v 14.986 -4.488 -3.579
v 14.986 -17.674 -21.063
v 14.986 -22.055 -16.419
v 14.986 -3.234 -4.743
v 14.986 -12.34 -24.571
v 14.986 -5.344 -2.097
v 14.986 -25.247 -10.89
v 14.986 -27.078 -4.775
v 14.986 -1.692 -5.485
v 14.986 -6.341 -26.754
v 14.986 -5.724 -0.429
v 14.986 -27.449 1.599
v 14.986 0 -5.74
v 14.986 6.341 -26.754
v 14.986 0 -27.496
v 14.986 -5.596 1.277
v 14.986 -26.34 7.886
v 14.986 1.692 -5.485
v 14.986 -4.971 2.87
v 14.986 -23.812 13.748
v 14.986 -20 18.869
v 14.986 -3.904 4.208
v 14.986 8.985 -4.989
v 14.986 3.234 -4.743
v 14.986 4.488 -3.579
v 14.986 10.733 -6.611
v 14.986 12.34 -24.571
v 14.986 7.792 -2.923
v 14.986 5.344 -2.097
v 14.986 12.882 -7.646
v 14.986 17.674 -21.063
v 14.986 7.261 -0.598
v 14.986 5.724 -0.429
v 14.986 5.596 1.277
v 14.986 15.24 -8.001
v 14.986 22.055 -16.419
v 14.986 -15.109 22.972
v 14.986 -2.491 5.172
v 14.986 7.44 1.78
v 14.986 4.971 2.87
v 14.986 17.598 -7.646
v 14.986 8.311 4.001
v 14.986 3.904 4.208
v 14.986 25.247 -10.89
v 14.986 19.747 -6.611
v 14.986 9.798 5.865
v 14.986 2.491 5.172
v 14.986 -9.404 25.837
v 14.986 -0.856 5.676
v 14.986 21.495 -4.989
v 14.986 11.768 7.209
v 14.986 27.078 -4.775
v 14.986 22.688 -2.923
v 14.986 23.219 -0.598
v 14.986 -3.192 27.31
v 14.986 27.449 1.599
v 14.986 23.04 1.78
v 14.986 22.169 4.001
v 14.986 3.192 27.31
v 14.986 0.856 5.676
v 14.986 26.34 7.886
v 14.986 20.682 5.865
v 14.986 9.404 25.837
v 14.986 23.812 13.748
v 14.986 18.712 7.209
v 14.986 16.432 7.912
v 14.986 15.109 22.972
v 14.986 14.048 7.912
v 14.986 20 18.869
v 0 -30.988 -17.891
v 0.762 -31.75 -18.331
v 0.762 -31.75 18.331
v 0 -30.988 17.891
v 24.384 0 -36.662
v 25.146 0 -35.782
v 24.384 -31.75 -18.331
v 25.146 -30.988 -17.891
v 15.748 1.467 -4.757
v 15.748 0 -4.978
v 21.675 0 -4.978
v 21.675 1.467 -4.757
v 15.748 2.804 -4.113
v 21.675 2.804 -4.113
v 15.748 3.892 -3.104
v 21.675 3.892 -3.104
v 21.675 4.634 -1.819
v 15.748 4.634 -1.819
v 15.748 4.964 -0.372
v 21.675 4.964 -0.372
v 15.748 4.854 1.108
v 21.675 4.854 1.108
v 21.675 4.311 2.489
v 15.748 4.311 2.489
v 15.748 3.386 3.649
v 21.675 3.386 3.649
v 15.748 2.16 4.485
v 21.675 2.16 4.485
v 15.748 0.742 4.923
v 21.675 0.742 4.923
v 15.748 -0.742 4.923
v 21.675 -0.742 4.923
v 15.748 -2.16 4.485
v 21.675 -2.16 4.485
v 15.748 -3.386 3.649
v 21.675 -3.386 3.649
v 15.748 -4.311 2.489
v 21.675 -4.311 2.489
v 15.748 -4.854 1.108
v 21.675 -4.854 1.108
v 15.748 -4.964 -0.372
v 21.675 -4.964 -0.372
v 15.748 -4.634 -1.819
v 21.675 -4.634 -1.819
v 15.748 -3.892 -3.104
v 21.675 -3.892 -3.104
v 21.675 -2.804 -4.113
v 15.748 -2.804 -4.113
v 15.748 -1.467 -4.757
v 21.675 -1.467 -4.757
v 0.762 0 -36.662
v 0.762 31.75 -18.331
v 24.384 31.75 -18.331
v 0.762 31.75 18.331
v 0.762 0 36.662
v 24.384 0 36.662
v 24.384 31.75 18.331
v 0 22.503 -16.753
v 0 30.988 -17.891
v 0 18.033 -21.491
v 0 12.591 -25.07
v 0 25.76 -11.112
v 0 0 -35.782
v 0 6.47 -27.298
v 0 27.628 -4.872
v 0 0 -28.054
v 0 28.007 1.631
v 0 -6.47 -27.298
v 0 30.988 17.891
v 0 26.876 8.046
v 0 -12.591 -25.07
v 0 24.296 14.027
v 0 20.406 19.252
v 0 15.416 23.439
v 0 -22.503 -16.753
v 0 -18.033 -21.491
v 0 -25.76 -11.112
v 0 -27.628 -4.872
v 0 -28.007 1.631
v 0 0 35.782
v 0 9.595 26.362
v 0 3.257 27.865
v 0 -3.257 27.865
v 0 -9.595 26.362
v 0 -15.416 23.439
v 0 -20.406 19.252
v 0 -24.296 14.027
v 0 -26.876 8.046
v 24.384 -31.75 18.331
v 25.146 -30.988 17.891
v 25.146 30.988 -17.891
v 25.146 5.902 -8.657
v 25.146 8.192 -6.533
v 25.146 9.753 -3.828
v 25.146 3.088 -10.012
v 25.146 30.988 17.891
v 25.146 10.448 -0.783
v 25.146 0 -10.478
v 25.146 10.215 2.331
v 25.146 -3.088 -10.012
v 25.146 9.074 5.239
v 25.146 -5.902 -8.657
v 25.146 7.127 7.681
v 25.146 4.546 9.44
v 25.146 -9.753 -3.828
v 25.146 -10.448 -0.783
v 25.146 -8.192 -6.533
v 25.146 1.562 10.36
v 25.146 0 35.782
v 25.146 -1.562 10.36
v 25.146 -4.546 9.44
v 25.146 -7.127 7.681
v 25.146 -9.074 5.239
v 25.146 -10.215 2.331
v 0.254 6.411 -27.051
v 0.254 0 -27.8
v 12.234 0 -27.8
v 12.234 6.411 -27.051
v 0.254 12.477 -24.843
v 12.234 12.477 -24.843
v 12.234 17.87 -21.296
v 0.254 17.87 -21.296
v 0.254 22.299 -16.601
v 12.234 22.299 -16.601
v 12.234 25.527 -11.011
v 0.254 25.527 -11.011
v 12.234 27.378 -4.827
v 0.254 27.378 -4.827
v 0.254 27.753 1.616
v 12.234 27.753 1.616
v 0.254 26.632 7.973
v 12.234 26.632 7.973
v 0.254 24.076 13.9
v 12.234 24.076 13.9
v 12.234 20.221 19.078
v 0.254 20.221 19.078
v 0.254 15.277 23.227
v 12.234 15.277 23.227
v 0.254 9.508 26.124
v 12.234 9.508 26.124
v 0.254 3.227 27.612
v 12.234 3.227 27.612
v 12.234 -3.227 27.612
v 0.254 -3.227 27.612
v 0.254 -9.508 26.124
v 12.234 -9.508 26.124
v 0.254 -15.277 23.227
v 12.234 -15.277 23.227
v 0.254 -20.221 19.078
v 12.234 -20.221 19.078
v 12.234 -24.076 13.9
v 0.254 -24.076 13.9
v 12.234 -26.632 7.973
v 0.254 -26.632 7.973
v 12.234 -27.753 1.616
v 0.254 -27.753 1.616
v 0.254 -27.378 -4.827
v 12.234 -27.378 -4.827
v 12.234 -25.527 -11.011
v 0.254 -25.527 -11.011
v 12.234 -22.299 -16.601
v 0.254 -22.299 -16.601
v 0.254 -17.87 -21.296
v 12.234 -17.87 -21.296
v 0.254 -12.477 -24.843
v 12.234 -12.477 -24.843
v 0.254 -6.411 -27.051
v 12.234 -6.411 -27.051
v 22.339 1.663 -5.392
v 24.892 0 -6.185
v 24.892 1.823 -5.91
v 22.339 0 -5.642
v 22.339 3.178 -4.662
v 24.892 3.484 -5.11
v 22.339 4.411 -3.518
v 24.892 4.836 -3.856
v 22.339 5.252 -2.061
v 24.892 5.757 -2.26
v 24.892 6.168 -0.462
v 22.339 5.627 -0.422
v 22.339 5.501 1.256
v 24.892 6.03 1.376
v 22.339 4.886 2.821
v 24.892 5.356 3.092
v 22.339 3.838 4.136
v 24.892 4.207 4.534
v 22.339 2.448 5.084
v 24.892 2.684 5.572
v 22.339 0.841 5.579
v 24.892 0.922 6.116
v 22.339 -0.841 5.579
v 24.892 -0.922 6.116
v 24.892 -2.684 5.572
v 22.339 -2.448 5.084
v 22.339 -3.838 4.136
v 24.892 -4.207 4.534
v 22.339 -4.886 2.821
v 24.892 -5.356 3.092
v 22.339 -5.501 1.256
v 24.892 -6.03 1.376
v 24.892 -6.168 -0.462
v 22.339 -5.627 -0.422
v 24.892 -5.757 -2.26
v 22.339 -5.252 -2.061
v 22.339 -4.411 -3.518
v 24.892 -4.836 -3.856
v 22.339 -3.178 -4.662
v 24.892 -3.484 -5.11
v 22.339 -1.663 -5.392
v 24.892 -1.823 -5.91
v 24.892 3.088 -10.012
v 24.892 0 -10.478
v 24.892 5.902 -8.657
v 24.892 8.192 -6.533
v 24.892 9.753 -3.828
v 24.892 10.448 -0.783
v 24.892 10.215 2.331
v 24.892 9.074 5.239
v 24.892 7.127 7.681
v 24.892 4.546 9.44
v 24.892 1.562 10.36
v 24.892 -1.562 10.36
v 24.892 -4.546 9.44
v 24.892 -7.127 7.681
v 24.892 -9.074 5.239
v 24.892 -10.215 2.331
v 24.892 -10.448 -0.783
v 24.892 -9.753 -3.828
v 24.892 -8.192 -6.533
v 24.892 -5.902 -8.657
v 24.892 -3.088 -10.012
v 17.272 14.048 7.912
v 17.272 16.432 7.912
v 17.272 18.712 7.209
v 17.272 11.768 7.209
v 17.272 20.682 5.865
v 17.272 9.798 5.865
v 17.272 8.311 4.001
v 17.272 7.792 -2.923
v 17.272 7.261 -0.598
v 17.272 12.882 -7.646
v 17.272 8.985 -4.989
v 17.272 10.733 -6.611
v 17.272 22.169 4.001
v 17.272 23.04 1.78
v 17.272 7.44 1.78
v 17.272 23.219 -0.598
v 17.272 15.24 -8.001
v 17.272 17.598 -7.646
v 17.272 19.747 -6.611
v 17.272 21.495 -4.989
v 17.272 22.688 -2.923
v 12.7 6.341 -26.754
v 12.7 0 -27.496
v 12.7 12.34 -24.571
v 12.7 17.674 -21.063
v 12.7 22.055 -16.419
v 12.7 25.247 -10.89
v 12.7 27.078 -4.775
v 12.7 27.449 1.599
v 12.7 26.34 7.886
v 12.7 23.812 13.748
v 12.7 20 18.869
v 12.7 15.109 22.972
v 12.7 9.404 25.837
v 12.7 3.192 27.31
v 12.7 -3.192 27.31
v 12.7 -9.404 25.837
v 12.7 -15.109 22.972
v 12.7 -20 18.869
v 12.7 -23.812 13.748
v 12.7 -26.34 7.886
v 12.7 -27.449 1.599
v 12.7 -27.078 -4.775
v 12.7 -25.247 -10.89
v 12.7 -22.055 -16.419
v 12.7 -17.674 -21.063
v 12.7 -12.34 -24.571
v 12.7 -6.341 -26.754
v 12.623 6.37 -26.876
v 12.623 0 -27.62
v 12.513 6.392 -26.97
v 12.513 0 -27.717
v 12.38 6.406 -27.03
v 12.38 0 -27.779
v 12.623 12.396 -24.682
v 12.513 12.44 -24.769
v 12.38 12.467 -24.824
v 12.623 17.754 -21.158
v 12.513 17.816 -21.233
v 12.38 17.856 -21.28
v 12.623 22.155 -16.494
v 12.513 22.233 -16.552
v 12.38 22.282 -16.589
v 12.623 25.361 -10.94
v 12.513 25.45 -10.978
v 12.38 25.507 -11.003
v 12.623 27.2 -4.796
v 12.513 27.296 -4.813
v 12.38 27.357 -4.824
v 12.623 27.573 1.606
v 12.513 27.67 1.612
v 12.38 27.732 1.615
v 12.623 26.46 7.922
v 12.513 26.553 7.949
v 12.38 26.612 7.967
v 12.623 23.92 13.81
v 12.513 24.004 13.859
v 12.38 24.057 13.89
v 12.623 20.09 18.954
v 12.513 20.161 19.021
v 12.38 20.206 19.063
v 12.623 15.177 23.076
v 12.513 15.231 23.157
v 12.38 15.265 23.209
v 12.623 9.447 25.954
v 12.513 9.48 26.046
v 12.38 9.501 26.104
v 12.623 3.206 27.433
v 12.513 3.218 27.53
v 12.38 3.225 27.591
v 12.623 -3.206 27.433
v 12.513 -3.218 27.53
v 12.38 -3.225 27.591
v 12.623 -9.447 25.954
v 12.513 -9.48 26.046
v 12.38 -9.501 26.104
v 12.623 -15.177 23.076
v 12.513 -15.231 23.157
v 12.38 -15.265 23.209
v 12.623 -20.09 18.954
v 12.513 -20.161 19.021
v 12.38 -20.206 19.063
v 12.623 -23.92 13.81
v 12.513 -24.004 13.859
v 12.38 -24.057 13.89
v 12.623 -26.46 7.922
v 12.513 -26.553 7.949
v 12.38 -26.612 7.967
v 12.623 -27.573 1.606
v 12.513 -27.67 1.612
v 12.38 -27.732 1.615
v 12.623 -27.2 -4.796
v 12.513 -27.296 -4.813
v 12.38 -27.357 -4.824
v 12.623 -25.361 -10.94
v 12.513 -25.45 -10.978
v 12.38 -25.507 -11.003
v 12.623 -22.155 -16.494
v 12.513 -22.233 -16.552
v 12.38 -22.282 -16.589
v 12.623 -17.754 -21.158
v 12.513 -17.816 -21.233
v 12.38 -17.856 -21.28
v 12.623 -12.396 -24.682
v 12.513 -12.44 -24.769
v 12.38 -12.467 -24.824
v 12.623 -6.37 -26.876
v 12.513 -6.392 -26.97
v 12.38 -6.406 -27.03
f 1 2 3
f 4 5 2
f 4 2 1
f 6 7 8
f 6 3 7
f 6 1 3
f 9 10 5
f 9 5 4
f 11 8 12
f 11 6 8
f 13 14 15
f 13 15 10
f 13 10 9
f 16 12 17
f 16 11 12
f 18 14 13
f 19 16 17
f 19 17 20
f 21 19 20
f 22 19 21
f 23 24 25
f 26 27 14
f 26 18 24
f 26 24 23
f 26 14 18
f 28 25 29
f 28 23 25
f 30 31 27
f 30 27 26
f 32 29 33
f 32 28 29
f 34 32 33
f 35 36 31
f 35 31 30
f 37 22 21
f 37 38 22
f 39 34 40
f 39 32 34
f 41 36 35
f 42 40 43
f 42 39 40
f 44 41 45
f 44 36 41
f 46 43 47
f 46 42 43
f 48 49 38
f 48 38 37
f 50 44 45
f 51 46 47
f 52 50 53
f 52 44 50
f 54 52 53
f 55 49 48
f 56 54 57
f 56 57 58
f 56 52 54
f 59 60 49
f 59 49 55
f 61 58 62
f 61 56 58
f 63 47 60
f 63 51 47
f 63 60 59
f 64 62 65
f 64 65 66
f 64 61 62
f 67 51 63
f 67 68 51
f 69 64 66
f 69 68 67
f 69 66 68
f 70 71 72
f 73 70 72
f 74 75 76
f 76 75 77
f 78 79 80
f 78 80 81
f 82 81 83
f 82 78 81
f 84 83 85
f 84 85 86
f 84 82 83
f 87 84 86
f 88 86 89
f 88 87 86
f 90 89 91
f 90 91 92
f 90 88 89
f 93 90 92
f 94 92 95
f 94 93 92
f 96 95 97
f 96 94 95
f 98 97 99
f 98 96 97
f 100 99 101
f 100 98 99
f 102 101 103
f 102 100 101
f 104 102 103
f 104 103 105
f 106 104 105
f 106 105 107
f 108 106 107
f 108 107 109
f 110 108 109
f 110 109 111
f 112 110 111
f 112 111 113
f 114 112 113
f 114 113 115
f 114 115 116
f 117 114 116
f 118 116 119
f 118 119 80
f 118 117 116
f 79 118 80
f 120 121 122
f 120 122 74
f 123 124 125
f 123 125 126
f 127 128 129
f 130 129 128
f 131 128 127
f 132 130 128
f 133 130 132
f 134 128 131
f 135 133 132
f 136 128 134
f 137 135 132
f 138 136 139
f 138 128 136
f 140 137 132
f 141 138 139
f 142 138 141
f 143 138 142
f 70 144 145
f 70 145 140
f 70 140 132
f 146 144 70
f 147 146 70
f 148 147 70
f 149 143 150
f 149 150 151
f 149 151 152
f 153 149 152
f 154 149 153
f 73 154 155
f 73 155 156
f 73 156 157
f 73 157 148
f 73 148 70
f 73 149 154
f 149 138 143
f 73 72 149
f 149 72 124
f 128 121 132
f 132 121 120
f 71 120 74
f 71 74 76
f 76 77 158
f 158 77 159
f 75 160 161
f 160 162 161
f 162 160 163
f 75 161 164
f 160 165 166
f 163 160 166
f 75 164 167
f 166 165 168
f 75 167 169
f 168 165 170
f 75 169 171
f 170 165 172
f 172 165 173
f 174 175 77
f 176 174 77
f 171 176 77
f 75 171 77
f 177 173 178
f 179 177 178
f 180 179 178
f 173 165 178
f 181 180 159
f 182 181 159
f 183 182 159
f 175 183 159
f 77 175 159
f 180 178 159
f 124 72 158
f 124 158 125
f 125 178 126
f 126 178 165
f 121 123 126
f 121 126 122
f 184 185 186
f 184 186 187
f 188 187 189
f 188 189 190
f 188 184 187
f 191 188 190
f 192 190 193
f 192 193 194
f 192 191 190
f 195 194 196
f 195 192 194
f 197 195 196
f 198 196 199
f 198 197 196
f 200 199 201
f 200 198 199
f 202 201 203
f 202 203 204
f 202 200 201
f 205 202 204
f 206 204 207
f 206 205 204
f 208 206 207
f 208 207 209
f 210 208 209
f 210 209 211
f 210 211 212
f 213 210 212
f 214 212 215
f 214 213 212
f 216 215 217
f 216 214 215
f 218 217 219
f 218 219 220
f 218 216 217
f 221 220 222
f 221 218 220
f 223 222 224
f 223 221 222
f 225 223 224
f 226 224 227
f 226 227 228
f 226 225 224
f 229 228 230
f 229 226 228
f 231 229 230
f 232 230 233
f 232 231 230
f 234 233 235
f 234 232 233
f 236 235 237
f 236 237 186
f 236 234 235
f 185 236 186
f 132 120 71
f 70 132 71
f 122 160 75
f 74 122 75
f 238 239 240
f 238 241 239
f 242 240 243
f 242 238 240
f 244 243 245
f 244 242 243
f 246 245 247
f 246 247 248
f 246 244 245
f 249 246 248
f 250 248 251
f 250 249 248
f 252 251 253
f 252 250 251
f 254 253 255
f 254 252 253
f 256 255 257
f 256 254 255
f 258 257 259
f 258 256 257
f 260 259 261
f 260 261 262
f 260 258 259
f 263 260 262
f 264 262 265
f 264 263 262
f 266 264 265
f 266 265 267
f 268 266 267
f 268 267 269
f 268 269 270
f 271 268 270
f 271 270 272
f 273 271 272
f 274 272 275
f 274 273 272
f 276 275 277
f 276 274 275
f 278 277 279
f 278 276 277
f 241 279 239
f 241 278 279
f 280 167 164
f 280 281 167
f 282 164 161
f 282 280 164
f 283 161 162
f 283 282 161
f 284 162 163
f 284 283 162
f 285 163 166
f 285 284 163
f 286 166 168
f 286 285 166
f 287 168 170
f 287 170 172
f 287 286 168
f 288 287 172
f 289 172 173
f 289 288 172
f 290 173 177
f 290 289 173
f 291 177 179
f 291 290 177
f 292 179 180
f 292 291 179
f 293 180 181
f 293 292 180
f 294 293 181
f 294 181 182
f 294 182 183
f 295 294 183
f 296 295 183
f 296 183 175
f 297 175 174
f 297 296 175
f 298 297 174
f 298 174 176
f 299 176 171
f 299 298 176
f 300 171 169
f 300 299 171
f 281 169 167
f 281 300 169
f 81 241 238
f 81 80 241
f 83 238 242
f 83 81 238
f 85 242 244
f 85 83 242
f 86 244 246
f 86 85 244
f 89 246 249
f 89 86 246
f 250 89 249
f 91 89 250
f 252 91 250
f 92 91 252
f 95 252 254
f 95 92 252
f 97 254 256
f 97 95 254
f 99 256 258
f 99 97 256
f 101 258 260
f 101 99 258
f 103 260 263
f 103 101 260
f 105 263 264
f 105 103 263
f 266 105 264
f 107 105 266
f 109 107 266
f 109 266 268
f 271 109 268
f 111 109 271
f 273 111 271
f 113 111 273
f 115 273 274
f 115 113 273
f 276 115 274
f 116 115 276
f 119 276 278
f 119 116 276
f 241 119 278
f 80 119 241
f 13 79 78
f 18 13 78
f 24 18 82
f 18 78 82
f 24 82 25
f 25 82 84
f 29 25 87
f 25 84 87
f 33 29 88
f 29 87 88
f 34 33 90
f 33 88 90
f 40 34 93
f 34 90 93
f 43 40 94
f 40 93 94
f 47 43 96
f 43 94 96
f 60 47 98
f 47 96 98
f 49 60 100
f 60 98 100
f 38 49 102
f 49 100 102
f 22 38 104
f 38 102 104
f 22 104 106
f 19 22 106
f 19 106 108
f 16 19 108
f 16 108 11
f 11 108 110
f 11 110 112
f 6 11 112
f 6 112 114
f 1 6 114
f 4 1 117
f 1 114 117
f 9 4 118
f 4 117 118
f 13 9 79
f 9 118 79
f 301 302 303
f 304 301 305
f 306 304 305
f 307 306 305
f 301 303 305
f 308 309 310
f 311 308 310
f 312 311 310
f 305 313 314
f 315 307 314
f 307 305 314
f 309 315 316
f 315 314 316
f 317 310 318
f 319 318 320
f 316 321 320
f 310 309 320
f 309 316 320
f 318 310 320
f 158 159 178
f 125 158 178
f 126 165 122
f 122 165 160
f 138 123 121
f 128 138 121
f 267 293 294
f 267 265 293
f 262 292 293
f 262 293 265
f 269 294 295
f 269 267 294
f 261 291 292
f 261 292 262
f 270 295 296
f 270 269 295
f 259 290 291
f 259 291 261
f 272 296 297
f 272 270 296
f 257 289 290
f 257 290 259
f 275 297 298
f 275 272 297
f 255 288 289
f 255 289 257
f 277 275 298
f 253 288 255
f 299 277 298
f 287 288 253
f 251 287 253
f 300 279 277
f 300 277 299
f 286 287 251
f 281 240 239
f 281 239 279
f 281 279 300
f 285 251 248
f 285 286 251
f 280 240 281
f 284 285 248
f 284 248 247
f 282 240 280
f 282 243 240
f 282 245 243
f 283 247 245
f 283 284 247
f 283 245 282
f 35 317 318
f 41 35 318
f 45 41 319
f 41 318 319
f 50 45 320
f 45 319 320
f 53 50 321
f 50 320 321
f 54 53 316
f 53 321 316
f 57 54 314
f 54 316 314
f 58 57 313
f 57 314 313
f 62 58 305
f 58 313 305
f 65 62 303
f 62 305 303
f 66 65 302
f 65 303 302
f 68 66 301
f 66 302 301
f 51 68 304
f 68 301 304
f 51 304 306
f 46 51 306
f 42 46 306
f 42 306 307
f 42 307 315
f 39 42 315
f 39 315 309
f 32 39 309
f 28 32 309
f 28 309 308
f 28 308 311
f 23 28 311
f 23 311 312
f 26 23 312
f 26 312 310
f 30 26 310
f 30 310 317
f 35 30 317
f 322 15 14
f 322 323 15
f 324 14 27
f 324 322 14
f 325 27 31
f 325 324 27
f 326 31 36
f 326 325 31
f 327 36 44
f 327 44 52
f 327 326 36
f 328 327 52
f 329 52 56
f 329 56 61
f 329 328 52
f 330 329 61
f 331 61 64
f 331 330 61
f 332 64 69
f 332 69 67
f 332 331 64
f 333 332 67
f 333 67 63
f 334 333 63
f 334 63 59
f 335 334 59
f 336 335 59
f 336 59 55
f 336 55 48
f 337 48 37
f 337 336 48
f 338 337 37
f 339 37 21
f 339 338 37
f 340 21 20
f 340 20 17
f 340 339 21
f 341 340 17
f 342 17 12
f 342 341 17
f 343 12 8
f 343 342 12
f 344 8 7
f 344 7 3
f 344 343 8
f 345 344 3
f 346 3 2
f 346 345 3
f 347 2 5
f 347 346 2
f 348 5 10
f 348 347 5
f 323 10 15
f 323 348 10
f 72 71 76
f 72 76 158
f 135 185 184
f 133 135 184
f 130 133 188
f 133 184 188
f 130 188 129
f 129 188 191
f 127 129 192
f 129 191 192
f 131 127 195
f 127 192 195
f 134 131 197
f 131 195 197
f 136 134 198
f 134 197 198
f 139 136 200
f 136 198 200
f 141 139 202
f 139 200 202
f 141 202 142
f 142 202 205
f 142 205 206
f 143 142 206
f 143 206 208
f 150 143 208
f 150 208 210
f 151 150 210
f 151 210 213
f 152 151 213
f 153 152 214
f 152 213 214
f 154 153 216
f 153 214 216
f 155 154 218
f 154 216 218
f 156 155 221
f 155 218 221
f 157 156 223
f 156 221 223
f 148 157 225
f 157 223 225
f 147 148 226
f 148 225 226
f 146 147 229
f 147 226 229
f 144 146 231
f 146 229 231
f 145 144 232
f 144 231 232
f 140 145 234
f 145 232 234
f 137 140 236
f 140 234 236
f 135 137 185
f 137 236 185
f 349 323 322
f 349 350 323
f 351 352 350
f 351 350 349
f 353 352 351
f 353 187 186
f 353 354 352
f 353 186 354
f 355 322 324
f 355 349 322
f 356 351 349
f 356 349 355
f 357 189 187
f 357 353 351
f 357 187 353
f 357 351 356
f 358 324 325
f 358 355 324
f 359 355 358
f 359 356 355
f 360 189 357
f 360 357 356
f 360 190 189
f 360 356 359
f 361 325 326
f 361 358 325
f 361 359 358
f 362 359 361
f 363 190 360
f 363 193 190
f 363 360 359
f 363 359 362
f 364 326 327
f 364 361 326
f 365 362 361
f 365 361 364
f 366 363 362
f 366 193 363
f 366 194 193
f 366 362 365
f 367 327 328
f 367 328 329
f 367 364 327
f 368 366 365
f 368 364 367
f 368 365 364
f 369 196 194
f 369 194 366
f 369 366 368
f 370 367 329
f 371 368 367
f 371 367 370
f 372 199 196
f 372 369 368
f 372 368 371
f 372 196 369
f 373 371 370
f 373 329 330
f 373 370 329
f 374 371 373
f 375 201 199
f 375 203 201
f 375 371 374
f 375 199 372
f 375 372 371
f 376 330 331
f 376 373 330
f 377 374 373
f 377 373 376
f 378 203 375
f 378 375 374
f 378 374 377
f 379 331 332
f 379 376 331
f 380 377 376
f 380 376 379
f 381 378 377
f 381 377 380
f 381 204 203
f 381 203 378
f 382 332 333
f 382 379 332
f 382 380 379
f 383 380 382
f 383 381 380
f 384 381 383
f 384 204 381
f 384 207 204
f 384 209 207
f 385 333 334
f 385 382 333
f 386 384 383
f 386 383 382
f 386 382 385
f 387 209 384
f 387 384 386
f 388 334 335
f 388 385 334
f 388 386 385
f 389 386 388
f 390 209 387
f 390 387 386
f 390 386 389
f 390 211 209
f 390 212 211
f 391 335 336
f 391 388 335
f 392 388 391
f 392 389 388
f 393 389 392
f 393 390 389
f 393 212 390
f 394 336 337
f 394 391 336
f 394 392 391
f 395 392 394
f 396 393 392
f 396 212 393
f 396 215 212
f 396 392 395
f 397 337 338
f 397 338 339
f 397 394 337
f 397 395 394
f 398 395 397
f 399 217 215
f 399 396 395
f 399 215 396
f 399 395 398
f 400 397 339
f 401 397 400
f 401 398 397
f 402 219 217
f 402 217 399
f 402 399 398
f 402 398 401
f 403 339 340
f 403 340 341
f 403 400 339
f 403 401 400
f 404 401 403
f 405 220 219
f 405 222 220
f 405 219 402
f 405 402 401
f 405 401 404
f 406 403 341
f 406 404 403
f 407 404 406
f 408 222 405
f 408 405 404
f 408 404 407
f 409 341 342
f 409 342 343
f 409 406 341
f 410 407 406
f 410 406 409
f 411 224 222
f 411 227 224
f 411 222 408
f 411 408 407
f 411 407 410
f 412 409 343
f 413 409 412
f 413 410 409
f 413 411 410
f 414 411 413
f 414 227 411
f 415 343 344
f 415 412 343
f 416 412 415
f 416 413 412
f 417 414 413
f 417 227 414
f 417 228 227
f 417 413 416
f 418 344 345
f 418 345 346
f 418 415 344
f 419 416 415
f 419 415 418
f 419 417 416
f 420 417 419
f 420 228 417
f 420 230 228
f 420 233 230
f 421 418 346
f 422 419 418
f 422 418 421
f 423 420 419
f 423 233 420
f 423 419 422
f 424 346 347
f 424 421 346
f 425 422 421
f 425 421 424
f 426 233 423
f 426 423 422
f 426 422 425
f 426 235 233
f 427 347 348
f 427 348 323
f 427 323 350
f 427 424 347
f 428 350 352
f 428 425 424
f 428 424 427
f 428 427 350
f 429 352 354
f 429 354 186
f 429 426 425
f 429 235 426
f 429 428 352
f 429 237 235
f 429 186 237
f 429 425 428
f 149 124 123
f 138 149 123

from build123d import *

# Parameters (mm, degrees)
EXTRUDE1_DEPTH = 25.146
HOLE1_D        = 16.002
HOLE1_DEPTH    = 2.286
CHAMFER1_SIZE  = 0.254
CHAMFER2_SIZE  = 0.762
CHAMFER3_SIZE  = 0.762
CHAMFER4_SIZE  = 0.762


with BuildPart() as part:
    # Sketch1 → Extrude1 (new body)
    with BuildSketch(Plane(origin=(0, 0, 0), x_dir=(0, -1, 0), z_dir=(-1, 0, 0))):
        Polygon((31.75, 18.330871047), (0, 36.661742094), (-31.75, 18.330871047), (-31.75, -18.330871047), (0, -36.661742094), (31.75, -18.330871047), align=None)
    extrude(amount=-EXTRUDE1_DEPTH)

    # Sketch2 → Cut-Revolve1 (revolve, cut)
    with BuildSketch(Plane.XY, mode=Mode.PRIVATE) as cut_revolve1_sk:
        with BuildLine():
            Line((0, 27.8003), (0, 0))
            Line((0, 0), (25.146, 0))
            Line((25.146, 0), (25.146, 10.4775))
            Line((25.146, 10.4775), (24.892, 10.4775))
            Line((24.892, 10.4775), (24.892, 6.1849))
            Line((24.892, 6.1849), (22.3393, 5.642306865))
            Line((22.3393, 5.642306865), (21.675393135, 4.9784))
            Line((21.675393135, 4.9784), (14.986, 4.9784))
            Line((14.986, 4.9784), (14.986, 27.4955))
            Line((14.986, 27.4955), (12.7, 27.4955))
            ThreePointArc((12.7, 27.4955), (12.512653369, 27.717323293), (12.234410309, 27.8003))
            Line((12.234410309, 27.8003), (0, 27.8003))
        make_face()
    revolve(cut_revolve1_sk.sketch.rotate(Axis((0, 0, 0), (1, 0, 0)), 270), axis=Axis((0, 0, 0), (1, 0, 0)), mode=Mode.SUBTRACT)  # turned: the seam where the file's is

    # Hole1
    with Locations(Plane.ZY.offset(-14.986)):
        with Locations((0, 15.24)):
            Hole(HOLE1_D / 2, depth=HOLE1_DEPTH)

    # Chamfer1
    chamfer1_edges = [part.edges().sort_by_distance(p)[0] for p in [
        (0, 0, 27.8003),
    ]]
    chamfer(chamfer1_edges, length=CHAMFER1_SIZE)

    # Chamfer2
    chamfer2_edges = [part.edges().sort_by_distance(p)[0] for p in [
        (14.986, 0, 4.9784),
    ]]
    chamfer(chamfer2_edges, length=CHAMFER2_SIZE)

    # Chamfer3
    chamfer3_edges = [part.edges().sort_by_distance(p)[0] for p in [
        (0, -15.875, -27.49630657),
        (0, 15.875, -27.49630657),
        (0, 31.75, 0),
        (0, 15.875, 27.49630657),
        (0, -15.875, 27.49630657),
        (0, -31.75, 0),
    ]]
    chamfer(chamfer3_edges, length=CHAMFER3_SIZE)

    # Chamfer4
    chamfer4_edges = [part.edges().sort_by_distance(p)[0] for p in [
        (25.146, 15.875, 27.49630657),
        (25.146, 31.75, 0),
        (25.146, 15.875, -27.49630657),
        (25.146, -15.875, -27.49630657),
        (25.146, -31.75, 0),
        (25.146, -15.875, 27.49630657),
    ]]
    chamfer(chamfer4_edges, length=CHAMFER4_SIZE)


solid = part.part
